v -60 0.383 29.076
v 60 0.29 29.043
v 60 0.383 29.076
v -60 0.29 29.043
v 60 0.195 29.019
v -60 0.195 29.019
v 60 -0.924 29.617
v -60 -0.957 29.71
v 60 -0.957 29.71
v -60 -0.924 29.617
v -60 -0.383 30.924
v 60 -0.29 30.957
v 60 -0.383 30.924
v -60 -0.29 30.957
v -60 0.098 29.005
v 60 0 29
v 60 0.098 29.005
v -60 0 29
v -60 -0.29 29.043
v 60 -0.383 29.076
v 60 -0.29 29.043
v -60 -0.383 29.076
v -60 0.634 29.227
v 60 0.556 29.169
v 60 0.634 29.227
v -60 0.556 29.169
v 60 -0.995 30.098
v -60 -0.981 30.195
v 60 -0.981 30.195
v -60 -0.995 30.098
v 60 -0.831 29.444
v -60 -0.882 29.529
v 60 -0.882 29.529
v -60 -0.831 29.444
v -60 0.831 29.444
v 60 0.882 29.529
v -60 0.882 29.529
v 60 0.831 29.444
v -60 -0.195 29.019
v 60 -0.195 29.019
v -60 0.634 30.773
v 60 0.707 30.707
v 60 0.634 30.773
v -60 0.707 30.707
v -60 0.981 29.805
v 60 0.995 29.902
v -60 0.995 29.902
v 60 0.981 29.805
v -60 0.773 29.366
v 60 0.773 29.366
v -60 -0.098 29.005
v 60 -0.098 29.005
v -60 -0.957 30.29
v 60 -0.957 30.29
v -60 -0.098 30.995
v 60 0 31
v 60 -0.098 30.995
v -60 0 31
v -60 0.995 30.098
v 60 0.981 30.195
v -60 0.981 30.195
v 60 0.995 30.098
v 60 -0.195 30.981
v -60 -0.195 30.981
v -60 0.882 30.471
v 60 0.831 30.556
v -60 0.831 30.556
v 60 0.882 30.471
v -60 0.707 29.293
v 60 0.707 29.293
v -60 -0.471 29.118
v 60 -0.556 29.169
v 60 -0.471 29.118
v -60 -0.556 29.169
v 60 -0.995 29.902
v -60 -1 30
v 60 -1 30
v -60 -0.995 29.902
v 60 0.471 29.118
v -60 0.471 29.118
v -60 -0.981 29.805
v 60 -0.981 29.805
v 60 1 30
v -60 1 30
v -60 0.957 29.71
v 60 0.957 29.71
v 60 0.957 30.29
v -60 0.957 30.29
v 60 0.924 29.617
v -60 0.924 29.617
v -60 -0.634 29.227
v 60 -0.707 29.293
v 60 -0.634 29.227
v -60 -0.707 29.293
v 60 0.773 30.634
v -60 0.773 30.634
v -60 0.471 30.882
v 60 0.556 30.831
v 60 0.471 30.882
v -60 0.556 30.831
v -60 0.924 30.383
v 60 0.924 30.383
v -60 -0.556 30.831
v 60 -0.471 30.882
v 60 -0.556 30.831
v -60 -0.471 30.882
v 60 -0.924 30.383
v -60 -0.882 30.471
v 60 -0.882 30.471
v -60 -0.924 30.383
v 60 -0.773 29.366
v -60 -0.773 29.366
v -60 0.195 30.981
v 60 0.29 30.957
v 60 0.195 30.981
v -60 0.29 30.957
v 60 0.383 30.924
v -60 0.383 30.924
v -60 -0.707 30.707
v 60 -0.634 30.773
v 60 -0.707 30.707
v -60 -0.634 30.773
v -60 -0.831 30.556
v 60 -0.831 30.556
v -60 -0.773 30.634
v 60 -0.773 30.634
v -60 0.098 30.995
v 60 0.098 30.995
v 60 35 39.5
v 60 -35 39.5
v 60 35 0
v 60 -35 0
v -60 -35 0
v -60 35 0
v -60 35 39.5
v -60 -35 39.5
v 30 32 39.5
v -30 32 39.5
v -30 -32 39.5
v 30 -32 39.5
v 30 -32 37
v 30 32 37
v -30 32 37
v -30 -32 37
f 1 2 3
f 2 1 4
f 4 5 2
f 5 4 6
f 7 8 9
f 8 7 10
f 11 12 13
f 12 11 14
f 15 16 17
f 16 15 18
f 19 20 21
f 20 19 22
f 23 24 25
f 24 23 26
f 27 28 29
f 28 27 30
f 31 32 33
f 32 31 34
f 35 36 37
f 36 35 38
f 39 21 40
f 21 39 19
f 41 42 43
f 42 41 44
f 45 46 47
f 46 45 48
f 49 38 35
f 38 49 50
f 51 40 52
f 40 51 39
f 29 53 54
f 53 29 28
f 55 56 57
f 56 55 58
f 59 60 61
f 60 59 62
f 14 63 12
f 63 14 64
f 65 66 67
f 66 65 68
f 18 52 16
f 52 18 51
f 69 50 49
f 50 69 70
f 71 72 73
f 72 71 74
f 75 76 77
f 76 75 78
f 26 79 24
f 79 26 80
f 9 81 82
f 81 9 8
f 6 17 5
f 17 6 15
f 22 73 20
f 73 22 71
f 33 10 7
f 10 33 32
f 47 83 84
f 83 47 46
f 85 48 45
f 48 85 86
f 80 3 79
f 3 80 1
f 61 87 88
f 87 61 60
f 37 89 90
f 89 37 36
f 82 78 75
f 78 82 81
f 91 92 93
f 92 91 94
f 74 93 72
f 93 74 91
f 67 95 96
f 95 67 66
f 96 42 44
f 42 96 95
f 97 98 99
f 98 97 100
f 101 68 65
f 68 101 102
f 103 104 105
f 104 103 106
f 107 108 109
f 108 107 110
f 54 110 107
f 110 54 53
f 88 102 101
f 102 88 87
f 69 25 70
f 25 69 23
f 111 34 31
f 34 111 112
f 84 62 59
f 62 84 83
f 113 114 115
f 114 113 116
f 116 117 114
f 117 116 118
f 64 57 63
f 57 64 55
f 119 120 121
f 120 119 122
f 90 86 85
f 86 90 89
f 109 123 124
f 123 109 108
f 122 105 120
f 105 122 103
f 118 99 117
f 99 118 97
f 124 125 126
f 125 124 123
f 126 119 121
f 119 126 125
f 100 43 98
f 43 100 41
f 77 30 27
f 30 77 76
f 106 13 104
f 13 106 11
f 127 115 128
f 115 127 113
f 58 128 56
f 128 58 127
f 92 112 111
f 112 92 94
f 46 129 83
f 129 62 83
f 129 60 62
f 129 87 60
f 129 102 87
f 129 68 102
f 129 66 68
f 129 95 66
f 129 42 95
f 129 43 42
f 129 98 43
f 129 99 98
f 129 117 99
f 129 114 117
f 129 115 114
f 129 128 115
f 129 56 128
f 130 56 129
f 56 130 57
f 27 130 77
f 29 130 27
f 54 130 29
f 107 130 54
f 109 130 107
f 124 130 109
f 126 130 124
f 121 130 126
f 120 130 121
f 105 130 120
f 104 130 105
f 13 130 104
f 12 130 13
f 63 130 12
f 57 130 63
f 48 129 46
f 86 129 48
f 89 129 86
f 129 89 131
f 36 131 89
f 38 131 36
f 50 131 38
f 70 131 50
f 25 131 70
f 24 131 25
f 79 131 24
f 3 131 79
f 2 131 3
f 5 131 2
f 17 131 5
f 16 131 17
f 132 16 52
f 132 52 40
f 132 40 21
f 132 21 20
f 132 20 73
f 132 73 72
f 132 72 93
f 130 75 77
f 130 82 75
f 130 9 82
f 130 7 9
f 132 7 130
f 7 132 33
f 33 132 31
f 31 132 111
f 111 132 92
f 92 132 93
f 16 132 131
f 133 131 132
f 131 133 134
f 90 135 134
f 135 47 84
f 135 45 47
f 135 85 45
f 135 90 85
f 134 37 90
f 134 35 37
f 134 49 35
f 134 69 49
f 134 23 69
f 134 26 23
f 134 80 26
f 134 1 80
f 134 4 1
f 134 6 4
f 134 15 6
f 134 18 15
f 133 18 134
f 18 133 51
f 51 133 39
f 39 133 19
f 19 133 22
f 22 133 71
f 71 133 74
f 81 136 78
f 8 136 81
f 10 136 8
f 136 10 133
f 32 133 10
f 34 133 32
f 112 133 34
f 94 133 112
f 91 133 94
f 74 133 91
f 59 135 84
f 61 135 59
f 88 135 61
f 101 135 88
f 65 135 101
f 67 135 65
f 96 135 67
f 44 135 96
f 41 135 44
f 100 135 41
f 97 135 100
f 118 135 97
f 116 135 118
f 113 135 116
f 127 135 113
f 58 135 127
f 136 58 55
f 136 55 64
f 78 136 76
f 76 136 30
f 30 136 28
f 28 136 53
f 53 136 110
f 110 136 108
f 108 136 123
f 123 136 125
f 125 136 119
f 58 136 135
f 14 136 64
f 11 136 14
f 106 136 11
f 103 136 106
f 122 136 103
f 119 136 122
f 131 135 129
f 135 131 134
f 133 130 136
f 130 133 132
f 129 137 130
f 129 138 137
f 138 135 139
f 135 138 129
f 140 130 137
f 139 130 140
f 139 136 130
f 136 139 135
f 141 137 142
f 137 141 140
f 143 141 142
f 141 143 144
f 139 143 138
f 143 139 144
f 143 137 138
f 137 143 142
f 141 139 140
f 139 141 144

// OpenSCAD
// Mini horizontal gel-electrophoresis buffer tank
// Print orientation: tank resting on XY plane, open top facing +Z

// ---------- Parameters ----------
tank_x      = 120;   // outer length in X (mm)
tank_y      = 70;    // outer width in Y (mm)
tank_z      = 40;    // outer height in Z (mm)
wall        = 3;     // wall thickness (mm)
floor       = 3;     // floor thickness (mm)
platform_x  = 60;    // platform length in X (mm), centred
platform_z  = 10;    // platform height above inner floor (mm) -> top at z = 13
hole_d      = 2;     // electrode hole diameter (mm)
eps         = 0.5;   // cutter overshoot past faces (mm)

$fn = 64;

// ---------- Derived ----------
inner_w = tank_y - 2 * wall;   // inner width (Y)
inner_f = tank_z - floor;      // inner floor height (top of floor)

// ---------- Model ----------
difference() {
    // Outer tank block
    translate([-tank_x / 2, -tank_y / 2, 0])
        cube([tank_x, tank_y, tank_z]);

    // Open top (cut above tank height)
    translate([-tank_x / 2 - eps, -tank_y / 2 - eps, tank_z - eps])
        cube([tank_x + 2 * eps, tank_y + 2 * eps, eps]);

    // Raised platform, full inner width, centred in X
    translate([-platform_x / 2, -inner_w / 2, inner_f])
        cube([platform_x, inner_w, platform_z]);

    // Horizontal electrode holes through each end wall, at y = 0, z = 30
    for (sx = [-1, 1])
        translate([sx > 0 ? tank_x / 2 - eps : -tank_x / 2 - eps, 0, 30])
            rotate([0, 90, 0])
                cylinder(d = hole_d, h = tank_x + 2 * eps, $fn = 64);
}
